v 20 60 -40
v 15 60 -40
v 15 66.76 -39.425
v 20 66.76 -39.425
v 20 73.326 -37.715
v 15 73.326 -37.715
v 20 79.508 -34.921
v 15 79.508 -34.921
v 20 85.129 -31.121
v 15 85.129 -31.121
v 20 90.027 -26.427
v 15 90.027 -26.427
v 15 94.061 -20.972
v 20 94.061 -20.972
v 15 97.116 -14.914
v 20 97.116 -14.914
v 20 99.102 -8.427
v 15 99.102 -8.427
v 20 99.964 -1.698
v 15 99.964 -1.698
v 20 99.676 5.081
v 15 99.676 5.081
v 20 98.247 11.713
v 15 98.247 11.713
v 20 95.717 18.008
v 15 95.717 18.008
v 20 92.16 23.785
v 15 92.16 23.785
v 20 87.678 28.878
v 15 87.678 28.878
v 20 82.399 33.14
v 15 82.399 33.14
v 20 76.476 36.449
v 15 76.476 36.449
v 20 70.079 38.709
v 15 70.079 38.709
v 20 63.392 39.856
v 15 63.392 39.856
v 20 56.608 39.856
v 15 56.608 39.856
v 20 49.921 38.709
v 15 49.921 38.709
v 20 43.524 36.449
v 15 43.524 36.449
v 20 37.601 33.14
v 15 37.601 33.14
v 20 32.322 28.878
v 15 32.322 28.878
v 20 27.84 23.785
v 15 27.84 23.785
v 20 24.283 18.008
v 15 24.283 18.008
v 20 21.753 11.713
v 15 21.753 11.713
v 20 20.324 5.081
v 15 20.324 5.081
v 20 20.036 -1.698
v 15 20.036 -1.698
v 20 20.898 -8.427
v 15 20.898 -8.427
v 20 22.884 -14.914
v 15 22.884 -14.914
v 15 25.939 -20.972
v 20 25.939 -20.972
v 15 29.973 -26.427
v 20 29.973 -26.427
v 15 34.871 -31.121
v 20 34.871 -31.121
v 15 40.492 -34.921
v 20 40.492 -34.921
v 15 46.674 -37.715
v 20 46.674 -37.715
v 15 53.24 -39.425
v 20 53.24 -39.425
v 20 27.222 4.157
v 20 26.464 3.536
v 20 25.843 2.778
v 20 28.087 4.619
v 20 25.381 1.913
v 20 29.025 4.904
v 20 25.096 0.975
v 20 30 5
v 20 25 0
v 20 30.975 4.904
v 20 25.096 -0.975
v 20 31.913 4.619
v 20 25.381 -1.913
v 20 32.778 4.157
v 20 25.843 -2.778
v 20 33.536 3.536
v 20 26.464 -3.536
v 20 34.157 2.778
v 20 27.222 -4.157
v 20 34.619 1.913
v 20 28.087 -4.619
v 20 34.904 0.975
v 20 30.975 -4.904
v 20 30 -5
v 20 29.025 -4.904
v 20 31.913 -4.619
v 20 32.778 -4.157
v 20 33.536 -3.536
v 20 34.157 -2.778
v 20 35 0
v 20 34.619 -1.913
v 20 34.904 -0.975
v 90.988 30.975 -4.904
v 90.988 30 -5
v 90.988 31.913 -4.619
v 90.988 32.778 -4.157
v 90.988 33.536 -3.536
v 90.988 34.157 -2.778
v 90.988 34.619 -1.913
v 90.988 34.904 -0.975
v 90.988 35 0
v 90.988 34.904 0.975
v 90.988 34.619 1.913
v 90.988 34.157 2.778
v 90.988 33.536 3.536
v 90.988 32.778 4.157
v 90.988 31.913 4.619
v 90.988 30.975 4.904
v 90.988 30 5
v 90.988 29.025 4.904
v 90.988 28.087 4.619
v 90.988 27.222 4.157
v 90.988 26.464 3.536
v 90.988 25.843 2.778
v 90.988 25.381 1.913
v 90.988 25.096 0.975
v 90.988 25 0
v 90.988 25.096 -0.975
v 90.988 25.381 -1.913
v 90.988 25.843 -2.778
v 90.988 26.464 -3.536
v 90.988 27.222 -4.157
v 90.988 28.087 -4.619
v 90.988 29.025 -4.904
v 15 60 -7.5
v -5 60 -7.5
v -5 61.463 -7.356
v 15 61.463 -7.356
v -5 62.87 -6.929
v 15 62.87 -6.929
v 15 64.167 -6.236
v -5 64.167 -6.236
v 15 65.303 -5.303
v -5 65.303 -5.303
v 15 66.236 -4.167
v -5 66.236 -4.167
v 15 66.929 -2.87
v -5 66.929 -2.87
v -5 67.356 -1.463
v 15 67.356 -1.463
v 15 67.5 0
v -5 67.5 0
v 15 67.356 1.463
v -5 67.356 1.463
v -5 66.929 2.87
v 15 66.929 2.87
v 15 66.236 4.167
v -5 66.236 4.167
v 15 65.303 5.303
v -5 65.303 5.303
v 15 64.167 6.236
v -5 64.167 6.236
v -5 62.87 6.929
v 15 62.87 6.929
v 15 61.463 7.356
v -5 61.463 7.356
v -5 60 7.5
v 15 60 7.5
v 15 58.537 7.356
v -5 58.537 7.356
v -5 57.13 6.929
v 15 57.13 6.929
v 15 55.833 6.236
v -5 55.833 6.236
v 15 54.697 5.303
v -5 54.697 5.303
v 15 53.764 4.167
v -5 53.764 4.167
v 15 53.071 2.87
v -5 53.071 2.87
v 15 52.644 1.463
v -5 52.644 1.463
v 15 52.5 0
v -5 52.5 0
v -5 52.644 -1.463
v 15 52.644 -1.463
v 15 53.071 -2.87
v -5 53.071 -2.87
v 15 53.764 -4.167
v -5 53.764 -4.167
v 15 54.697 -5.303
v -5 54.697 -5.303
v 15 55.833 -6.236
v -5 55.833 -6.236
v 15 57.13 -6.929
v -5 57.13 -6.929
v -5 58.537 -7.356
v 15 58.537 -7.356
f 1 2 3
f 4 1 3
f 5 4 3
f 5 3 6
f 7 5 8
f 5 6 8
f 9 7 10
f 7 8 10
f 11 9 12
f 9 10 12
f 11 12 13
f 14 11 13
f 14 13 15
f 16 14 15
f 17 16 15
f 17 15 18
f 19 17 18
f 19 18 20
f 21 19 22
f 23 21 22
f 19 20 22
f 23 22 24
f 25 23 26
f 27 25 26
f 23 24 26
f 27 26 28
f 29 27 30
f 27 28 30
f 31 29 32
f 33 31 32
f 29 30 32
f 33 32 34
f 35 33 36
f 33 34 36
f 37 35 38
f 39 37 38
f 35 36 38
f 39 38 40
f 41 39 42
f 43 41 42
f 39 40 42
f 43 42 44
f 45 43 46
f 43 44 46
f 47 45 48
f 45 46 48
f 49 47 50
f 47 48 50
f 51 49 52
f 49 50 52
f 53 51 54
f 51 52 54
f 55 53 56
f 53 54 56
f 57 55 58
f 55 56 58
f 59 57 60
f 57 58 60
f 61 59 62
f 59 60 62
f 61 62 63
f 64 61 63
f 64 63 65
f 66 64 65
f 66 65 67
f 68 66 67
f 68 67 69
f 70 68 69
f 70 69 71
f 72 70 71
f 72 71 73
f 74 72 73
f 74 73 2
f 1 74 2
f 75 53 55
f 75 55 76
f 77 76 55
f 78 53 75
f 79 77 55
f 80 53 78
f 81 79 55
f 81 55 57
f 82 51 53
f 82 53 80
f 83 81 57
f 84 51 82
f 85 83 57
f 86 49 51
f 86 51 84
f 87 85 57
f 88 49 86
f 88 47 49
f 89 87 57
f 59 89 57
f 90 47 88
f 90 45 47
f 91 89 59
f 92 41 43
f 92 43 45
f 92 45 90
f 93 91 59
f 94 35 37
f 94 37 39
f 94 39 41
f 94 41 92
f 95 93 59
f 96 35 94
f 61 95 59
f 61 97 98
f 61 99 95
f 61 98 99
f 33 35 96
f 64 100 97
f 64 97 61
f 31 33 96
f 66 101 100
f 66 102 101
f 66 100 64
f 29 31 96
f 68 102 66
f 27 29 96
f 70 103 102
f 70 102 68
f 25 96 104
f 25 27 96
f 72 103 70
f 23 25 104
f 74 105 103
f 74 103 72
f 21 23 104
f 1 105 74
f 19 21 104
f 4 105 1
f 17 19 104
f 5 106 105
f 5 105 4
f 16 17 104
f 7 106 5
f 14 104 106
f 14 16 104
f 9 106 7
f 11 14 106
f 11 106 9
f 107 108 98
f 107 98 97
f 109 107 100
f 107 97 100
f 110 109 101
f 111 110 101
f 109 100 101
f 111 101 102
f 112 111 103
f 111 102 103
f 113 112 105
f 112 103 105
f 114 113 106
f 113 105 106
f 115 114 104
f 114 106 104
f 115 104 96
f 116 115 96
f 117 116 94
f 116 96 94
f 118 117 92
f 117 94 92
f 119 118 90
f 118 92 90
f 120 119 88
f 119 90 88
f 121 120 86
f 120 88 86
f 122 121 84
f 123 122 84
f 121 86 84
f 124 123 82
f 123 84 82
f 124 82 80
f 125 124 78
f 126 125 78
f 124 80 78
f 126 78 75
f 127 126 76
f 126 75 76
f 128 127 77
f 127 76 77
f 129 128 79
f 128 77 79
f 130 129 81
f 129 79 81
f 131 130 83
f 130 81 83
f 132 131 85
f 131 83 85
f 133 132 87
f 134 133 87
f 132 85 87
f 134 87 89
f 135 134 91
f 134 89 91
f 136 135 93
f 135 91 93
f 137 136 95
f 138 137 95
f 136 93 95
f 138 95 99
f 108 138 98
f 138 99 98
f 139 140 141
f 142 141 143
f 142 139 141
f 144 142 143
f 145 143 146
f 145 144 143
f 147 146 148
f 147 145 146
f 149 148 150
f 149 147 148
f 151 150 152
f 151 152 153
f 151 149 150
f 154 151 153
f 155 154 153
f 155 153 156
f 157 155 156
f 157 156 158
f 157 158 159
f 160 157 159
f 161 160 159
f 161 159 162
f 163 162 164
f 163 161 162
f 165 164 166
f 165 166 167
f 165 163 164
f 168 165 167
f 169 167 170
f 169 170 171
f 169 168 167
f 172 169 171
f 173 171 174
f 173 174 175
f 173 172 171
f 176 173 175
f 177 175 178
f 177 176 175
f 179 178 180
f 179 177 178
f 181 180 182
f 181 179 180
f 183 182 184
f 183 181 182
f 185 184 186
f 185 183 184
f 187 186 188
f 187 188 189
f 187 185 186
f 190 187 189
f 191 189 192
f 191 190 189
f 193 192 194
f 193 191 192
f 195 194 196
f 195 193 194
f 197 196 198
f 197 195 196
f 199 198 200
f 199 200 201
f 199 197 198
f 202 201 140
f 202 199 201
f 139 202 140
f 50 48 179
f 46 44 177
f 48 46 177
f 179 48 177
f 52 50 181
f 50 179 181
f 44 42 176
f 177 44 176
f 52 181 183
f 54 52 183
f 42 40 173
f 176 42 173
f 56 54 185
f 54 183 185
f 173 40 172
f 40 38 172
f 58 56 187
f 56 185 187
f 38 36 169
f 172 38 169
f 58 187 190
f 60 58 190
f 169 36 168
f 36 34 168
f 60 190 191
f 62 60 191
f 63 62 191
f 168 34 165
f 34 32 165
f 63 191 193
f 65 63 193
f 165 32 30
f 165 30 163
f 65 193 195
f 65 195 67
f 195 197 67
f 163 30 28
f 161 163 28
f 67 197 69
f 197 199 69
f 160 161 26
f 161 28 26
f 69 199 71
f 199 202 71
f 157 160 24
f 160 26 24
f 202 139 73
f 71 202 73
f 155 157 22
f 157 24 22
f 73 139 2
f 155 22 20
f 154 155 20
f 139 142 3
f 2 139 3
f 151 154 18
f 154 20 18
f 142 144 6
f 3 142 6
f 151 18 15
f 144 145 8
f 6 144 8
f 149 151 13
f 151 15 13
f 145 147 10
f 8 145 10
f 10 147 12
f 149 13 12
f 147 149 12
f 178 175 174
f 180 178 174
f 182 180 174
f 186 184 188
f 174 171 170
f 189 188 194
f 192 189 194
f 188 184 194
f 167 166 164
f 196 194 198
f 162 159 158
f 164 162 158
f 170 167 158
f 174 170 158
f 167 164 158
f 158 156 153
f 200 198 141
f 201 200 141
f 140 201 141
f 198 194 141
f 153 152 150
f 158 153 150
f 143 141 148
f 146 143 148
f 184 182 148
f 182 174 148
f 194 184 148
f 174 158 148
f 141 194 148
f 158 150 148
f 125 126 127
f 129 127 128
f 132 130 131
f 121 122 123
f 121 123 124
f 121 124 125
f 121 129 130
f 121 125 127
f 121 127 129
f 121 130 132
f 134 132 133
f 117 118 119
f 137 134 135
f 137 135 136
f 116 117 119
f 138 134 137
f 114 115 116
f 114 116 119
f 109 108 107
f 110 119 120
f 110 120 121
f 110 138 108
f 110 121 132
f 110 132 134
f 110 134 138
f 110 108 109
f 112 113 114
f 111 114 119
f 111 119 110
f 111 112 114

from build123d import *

# Parameters (mm, degrees)
SKETCH2_R                = 7.5
BOSS_EXTRUDE1_DEPTH      = 5
BOSS_EXTRUDE1_DEPTH_BACK = 15
SKETCH3_R                = 40
BOSS_EXTRUDE2_DEPTH      = 5
SKETCH4_R                = 5
BOSS_EXTRUDE3_DEPTH      = 70.98805519


with BuildPart() as part:
    # Sketch2 → Boss-Extrude1 (new body, two sides)
    with BuildSketch(Plane(origin=(10, 0, 0), x_dir=(0, 0, -1), z_dir=(1, 0, 0))) as boss_extrude1_sk:
        with Locations((0, 60)):
            Circle(SKETCH2_R)
    extrude(amount=BOSS_EXTRUDE1_DEPTH)
    extrude(boss_extrude1_sk.sketch, amount=-BOSS_EXTRUDE1_DEPTH_BACK)

    # Sketch3 → Boss-Extrude2 (add)
    with BuildSketch(Plane(origin=(15, 0, 0), x_dir=(0, 0, -1), z_dir=(1, 0, 0))):
        with Locations((0, 60)):
            Circle(SKETCH3_R)
    extrude(amount=BOSS_EXTRUDE2_DEPTH)

    # Sketch4 → Boss-Extrude3 (add)
    with BuildSketch(Plane(origin=(20, 0, 0), x_dir=(0, 0, -1), z_dir=(1, 0, 0))):
        with Locations((0, 30)):
            Circle(SKETCH4_R)
    extrude(amount=BOSS_EXTRUDE3_DEPTH)


solid = part.part
